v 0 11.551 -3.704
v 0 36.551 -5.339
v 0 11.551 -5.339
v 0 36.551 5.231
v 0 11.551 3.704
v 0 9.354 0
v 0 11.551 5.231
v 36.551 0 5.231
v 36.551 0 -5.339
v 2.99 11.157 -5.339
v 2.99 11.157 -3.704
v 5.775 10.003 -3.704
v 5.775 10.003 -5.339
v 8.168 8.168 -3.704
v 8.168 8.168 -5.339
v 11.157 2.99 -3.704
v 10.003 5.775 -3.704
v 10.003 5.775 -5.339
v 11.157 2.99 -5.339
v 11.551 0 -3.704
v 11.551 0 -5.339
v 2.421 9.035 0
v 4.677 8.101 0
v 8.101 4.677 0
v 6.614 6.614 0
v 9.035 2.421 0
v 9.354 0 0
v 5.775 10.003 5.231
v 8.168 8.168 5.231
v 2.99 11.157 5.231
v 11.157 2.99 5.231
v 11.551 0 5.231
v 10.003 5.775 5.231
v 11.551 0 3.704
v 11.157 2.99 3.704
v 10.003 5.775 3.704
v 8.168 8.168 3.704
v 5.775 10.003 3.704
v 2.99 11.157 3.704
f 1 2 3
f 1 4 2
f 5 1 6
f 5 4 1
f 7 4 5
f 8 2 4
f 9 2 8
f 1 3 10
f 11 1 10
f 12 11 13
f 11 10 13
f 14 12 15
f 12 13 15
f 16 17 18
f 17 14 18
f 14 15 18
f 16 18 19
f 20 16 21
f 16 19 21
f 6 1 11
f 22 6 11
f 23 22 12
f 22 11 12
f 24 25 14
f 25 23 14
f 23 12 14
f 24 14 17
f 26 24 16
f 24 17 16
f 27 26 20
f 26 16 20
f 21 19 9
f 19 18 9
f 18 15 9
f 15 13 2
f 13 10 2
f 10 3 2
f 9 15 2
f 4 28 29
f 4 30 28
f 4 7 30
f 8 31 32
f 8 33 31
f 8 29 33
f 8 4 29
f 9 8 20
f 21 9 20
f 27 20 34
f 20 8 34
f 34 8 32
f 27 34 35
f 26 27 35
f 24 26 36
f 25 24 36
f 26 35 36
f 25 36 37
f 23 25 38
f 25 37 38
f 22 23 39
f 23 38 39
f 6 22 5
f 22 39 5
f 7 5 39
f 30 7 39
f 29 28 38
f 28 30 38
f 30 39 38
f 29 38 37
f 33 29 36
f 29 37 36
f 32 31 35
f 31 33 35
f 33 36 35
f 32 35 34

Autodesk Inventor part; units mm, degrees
ref_plane "YZ Plane" through (0, 0, 0) normal (1, 0, 0) x (0, 1, 0)
ref_plane "XZ Plane" through (0, 0, 0) normal (0, 1, 0) x (-1, 0, 0)
sketch "Sketch7" plane through (0, 0, 0) normal (0, 1, 0) x (-1, 0, 0)
  line L0 (0, 0) -> (0, 15.7673)
  line L1 (0, 0) -> (-13.3368, 0) construction
  line L2 (0, 15.7673) -> (-13.3368, 0) construction
  line L3 (0, 15.7673) -> (-18.6413, 0) construction
  line L4 (0, 15.7673) -> (-12.4569, -5.231) construction
  line L5 (0, 0) -> (0, -15.7673)
  line L6 (0, -15.7673) -> (-13.3368, 0) construction
  line L7 (0, -15.7673) -> (-18.6413, 0) construction
  line L8 (0, -15.7673) -> (-12.4569, 5.231) construction
  line L9 (-12.4569, 5.231) -> (-18.6413, 0) construction
  line L10 (-9.3537, 0) -> (-18.5948, -7.8164) construction
  line L11 (-9.3537, 0) -> (-18.0926, 7.3915) construction
  line L12 (0, -29.7093) -> (0, 66.7435) projected
  line L13 (-53.5, -5.9919) -> (-53.5, 6.008)
  line L14 (17.5786, 0) -> (-94.9714, 0) projected
  line L15 (-15.989, 2.2434) -> (-10.6846, -2.2434) construction
  line L16 (-10.6846, 2.2434) -> (-15.989, -2.2434) construction
  line L17 (-26.151, -15.9303) -> (-40.3783, -15.9303) construction
  line L18 (-40.3783, -15.9303) -> (-40.3783, -12.7539) construction
  line L19 (-40.3783, -12.7539) -> (-26.151, -12.7539) construction
  line L20 (-26.151, -12.7539) -> (-26.151, -15.9303) construction
  point P0 (-53.5, 0)
  dimension "Roller_Side_difference" = -0.0003
  dimension "d90" = 15.7673
  dimension "d201" = 53.5
  dimension "d343" = 99.548
  dimension "d344" = 99.549
  dimension "d367" = 8.1
sketch "Sketch44" plane through (0, 0, 0) normal (0, 1, 0) x (-1, 0, 0)
  line L0 (-18.7962, 0) -> (3.1509, -18.5634)
  line L1 (17.5786, 0) -> (-94.9714, 0) projected
  line L2 (-11.4508, 5.231) -> (-1, 5.231) projected
  line L3 (-14.3852, 5.231) -> (-53.5, 5.231) projected
  line L4 (0, 0) -> (0, 15.7673) projected
  line L5 (0, 0) -> (0, -15.8983)
  line L6 (-25.707, -7.6404) -> (3.3976, -7.6404)
  line L7 (-18.6413, 0) -> (0, -15.7673)
  point P0 (-3.6044, 0)
  point P1 (-9.6083, -7.6404)
  point P2 (0, -7.6404)
  dimension "d615" = 0.1
sketch "Sketch45" plane through (0, 0, 0) normal (0, 0, 1) x (1, 0, 0)
  line L0 (-12.5, 2.5) -> (12.5, 2.5)
  line L1 (12.5, 2.5) -> (12.5, -2.5)
  line L2 (12.5, -2.5) -> (-12.5, -2.5)
  line L3 (-12.5, -2.5) -> (-12.5, 2.5)
  line L4 (-12.5, 2.5) -> (12.5, -2.5) construction
  line L5 (12.5, 2.5) -> (-12.5, -2.5) construction
  point P0 (0, 0)
  dimension "d617" = 25
  dimension "d618" = 5
sketch "Sketch1" plane through (0, 0, 0) normal (0, 0, 1) x (1, 0, 0)
  circle A0 centre (0, 0) radius 13.3368 construction
  line L0 (0, 0) -> (13.3368, 0)
  line L1 (0, 0) -> (13.3368, 4.025)
  line L2 (13.3368, 0) -> (13.3368, 4.025)
  circle A1 centre (0, 0) radius 53.5
  point P0 (56.8, 0)
  dimension "d56" = 13.3368
  dimension "d57" = 4.025
  dimension "d400" = 53.5
  dimension "d495" = 2.5
  dimension "d496" = 8
  dimension "d531" = 5.5
  dimension "d532" = 5.5
  dimension "d533" = 5.5
  dimension "d537" = 24.5
  dimension "d538" = 3
  dimension "d543" = 5.5
  dimension "d549" = 3
  dimension "d550" = 3
  dimension "d567" = 5.5
  dimension "d568" = 5.5
sketch "Roller1" plane through (0, 0, 0) normal (0, 1, 0) x (-1, 0, 0)
  line L0 (0, 15.7673) -> (-12.4569, -5.231) construction
  line L1 (0, 15.7673) -> (-18.6413, 0) construction
  line L2 (-9.3537, 0) -> (-18.0926, 7.3915) construction
  line L3 (0, -15.7673) -> (-18.6413, 0) construction
  line L4 (-9.4248, -0.0708) -> (-12.4245, -5.1274)
  line L5 (-12.4245, -5.1274) -> (-18.5445, 0.0491)
  line L6 (-18.5445, 0.0491) -> (-14.0556, 3.846)
  line L7 (-14.0556, 3.846) -> (-9.4248, -0.0708)
  line L8 (-11.7456, 1.8921) -> (-15.4898, -2.5346)
  line L9 (-10.9821, 1.2463) -> (-14.7263, -3.1804)
  point P0 (0, 0)
  point P1 (-15.4845, -2.5391)
  dimension "d345" = 0.025
  dimension "d346" = 0.025
  dimension "d347" = 0.1
  dimension "d348" = 0.1
  dimension "d349" = 99.549
  dimension "d350" = 99.548
  dimension "d357" = 1
  dimension "d369" = 4.0148
sketch "Roller2" plane through (0, 0, 0) normal (0, 1, 0) x (-1, 0, 0)
  line L0 (0, -15.7673) -> (-12.4569, 5.231) construction
  line L1 (-9.3537, 0) -> (-18.5948, -7.8164) construction
  line L2 (0, -15.7673) -> (-18.6413, 0) construction
  line L3 (0, 15.7673) -> (-18.6413, 0) construction
  line L4 (-12.4245, 5.1274) -> (-9.4248, 0.0708)
  line L5 (-9.4248, 0.0708) -> (-14.0556, -3.846)
  line L6 (-14.0556, -3.846) -> (-18.5445, -0.0491)
  line L7 (-18.5445, -0.0491) -> (-12.4245, 5.1274)
  line L8 (-15.4845, 2.5391) -> (-11.7403, -1.8876)
  line L9 (-14.721, 3.1849) -> (-10.9767, -1.2418)
  point P0 (0, 0)
  dimension "d351" = 0.025
  dimension "d352" = 0.025
  dimension "d354" = 0.1
  dimension "d355" = 99.548
  dimension "d356" = 99.549
  dimension "d370" = 0.1
  dimension "d371" = 1
sketch "Sketch22" plane through (0, 0, 0) normal (0, 1, 0) x (-1, 0, 0)
  line L0 (-31.756, 8.0215) -> (-17.5287, 8.0215) construction
  line L1 (-17.5287, 8.0215) -> (-17.5287, 4.8451) construction
  line L2 (-17.5287, 4.8451) -> (-31.756, 4.8451) construction
  line L3 (-31.756, 4.8451) -> (-31.756, 8.0215) construction
  point P0 (0, 0)
  dimension "Roller_Side_difference" = -0.0003
sketch "Sketch2" plane through (0, 0, 0) normal (0, 1, 0) x (-1, 0, 0)
  line L0 (0, 0) -> (0, 13.3368) construction
  line L1 (0, 0) -> (-13.3368, 0) projected
  line L2 (0, 0) -> (0, -13.3368)
  line L3 (0, -13.3368) -> (-13.3368, 0) construction
  line L4 (0, 13.3368) -> (-13.3368, 0) construction
  line L5 (-78.8928, 52.9645) -> (0, 13.3368) construction
  line L6 (-34.8011, 15.91) -> (0, 13.3368) construction
  line L7 (-34.8011, 15.91) -> (0, -13.3368) construction
  line L8 (-48.3339, 16.9106) -> (0, -13.3368) construction
  point P0 (-17.4708, -4.134)
sketch "Sketch23" plane through (0, 0, 0) normal (0, 1, 0) x (-1, 0, 0)
  line L0 (0, -15.7673) -> (-12.4569, 5.231) construction
  line L1 (0, -15.7673) -> (-18.6413, 0) construction
  line L2 (0, 15.7673) -> (-12.4569, -5.231) construction
  line L3 (-12.4569, 5.231) -> (-18.6413, 0) construction
  line L4 (0, 15.7673) -> (-18.6413, 0) construction
  line L5 (-12.4569, 5.231) -> (-12.4569, -5.231) construction
  line L6 (17.5786, 0) -> (-94.9714, 0) projected
  line L7 (-11.4508, 3.731) -> (-9.2677, 0.051)
  line L8 (-9.2677, -0.051) -> (-11.4508, -3.731)
  line L9 (-14.3852, 3.731) -> (-18.7059, 0.0764)
  line L10 (-18.7059, -0.0764) -> (-14.3852, -3.731)
  arc A0 (-18.7059, 0.0764) -> (-18.7059, -0.0764) centre (-18.6413, 0) ccw
  arc A1 (-9.2677, -0.051) -> (-9.2677, 0.051) centre (-9.3537, 0) ccw
  line L11 (-11.4508, 3.731) -> (-11.4508, 5.231)
  line L12 (-11.4508, 5.231) -> (-1, 5.231)
  line L13 (-1, 5.231) -> (-1, -5.231)
  line L14 (-1, -5.231) -> (-11.4508, -5.231)
  line L15 (-11.4508, -5.231) -> (-11.4508, -3.731)
  line L16 (-14.3852, 3.731) -> (-14.3852, 5.231)
  line L17 (-14.3852, 5.231) -> (-53.5, 5.231)
  line L18 (-53.5, 5.231) -> (-53.5, -5.231)
  line L19 (-14.3852, -3.731) -> (-14.3852, -5.231)
  line L20 (-14.3852, -5.231) -> (-53.5, -5.231)
  line L21 (-12.4569, 5.231) -> (-12.4569, 5.231)
  line L22 (-12.4569, -5.231) -> (-12.4569, -5.231)
  line L23 (0, -29.7093) -> (0, 66.7435) projected
  line L24 (-18.7962, 0) -> (-53.5, 0)
  point P0 (0, 0)
  point P1 (-9.2374, 0)
  point P2 (-18.7413, 0)
  point P3 (-53.5, 0)
  dimension "d378" = 90
  dimension "d379" = 0.1
  dimension "d380" = 0.1
  dimension "d381" = 0.1
  dimension "d382" = 0.1
  dimension "d383" = 0.1
  dimension "d384" = 10.4619
  dimension "d385" = 0
  dimension "d386" = 0
  dimension "d391" = 1
  dimension "d392" = 53.5
  dimension "d393" = 1.5
  dimension "d394" = 1.5
  dimension "d395" = 1.5
  dimension "d396" = 1.5
sketch "Sketch46" plane through (0, 0, 0) normal (0, 1, 0) x (-1, 0, 0)
  line L0 (-11.4508, 3.731) -> (-9.2677, 0.051) projected
  line L1 (-9.2677, -0.051) -> (-11.4508, -3.731) projected
  arc A0 (-9.2677, -0.051) -> (-9.2677, 0.051) centre (-9.3537, 0) ccw projected
  line L2 (-11.4508, 3.731) -> (-11.4508, 5.231) projected
  line L3 (-11.4508, -5.231) -> (-11.4508, -3.731) projected
  line L4 (-11.5508, 5.231) -> (-11.5508, 3.7035)
  line L5 (-11.5508, 3.7035) -> (-9.3537, 0)
  line L6 (-9.3537, 0) -> (-11.5508, -3.7035)
  line L7 (-11.5508, -3.7035) -> (-11.5508, -5.3394)
  line L8 (-11.5508, 5.231) -> (-36.5508, 5.231)
  line L9 (-11.5508, -5.3394) -> (-36.5508, -5.3394)
  line L10 (-36.5508, -5.3394) -> (-36.5508, 5.231)
  line L11 (0, -29.7093) -> (0, 66.7435) projected
  point P0 (0, 0)
  dimension "d624" = 0.1
  dimension "d625" = 25
revolve "Revolution18" add sketch "Sketch46" angle 90 about axis through (0, 0, -10) along (0, 0, 1)
sketch "Sketch47" plane through (36.5508, 0, -5.3394) normal (0, 0, -1) x (-1, 0, 0)
  line L0 (36.5508, 36.5508) -> (0, 0)
  arc A0 (36.5508, 36.5508) -> (0, 0) centre (36.5508, 0) ccw projected
  point P0 (36.5508, 0)
extrude "Extrusion40" cut sketch "Sketch47" against normal through all
sketch "Sketch40" plane through (0, 0, -5.231) normal (0, 0, -1) x (-1, 0, 0)
  circle A0 centre (53.5, 0) radius 2.75 projected
  circle A1 centre (0, 0) radius 53.5 projected
  point P0 (53.4293, 2.7491)
  point P1 (53.4293, -2.7491)
  dimension "d585" = 8
  dimension "d587" = 1.75
  dimension "d589" = 3
  dimension "d592" = 2
  dimension "d593" = 12
  dimension "d594" = 12
  dimension "d611" = 360
equation "\"Roller_Side_difference\" = -0.001568deg"
equation "\"Cycloid_Top_Plate_Fasner_Inner\" = 61.25"
equation "\"Cycloid_Top_Plate_Fasner_Outer\" = 85.75"
equation "\"Roller_Hole_Radius\" = 1"
equation "\"Distance_To_Bearing\" = 20.65135"
equation "\"d514\" = 0.2"
properties part number "InnerRaceTool"
